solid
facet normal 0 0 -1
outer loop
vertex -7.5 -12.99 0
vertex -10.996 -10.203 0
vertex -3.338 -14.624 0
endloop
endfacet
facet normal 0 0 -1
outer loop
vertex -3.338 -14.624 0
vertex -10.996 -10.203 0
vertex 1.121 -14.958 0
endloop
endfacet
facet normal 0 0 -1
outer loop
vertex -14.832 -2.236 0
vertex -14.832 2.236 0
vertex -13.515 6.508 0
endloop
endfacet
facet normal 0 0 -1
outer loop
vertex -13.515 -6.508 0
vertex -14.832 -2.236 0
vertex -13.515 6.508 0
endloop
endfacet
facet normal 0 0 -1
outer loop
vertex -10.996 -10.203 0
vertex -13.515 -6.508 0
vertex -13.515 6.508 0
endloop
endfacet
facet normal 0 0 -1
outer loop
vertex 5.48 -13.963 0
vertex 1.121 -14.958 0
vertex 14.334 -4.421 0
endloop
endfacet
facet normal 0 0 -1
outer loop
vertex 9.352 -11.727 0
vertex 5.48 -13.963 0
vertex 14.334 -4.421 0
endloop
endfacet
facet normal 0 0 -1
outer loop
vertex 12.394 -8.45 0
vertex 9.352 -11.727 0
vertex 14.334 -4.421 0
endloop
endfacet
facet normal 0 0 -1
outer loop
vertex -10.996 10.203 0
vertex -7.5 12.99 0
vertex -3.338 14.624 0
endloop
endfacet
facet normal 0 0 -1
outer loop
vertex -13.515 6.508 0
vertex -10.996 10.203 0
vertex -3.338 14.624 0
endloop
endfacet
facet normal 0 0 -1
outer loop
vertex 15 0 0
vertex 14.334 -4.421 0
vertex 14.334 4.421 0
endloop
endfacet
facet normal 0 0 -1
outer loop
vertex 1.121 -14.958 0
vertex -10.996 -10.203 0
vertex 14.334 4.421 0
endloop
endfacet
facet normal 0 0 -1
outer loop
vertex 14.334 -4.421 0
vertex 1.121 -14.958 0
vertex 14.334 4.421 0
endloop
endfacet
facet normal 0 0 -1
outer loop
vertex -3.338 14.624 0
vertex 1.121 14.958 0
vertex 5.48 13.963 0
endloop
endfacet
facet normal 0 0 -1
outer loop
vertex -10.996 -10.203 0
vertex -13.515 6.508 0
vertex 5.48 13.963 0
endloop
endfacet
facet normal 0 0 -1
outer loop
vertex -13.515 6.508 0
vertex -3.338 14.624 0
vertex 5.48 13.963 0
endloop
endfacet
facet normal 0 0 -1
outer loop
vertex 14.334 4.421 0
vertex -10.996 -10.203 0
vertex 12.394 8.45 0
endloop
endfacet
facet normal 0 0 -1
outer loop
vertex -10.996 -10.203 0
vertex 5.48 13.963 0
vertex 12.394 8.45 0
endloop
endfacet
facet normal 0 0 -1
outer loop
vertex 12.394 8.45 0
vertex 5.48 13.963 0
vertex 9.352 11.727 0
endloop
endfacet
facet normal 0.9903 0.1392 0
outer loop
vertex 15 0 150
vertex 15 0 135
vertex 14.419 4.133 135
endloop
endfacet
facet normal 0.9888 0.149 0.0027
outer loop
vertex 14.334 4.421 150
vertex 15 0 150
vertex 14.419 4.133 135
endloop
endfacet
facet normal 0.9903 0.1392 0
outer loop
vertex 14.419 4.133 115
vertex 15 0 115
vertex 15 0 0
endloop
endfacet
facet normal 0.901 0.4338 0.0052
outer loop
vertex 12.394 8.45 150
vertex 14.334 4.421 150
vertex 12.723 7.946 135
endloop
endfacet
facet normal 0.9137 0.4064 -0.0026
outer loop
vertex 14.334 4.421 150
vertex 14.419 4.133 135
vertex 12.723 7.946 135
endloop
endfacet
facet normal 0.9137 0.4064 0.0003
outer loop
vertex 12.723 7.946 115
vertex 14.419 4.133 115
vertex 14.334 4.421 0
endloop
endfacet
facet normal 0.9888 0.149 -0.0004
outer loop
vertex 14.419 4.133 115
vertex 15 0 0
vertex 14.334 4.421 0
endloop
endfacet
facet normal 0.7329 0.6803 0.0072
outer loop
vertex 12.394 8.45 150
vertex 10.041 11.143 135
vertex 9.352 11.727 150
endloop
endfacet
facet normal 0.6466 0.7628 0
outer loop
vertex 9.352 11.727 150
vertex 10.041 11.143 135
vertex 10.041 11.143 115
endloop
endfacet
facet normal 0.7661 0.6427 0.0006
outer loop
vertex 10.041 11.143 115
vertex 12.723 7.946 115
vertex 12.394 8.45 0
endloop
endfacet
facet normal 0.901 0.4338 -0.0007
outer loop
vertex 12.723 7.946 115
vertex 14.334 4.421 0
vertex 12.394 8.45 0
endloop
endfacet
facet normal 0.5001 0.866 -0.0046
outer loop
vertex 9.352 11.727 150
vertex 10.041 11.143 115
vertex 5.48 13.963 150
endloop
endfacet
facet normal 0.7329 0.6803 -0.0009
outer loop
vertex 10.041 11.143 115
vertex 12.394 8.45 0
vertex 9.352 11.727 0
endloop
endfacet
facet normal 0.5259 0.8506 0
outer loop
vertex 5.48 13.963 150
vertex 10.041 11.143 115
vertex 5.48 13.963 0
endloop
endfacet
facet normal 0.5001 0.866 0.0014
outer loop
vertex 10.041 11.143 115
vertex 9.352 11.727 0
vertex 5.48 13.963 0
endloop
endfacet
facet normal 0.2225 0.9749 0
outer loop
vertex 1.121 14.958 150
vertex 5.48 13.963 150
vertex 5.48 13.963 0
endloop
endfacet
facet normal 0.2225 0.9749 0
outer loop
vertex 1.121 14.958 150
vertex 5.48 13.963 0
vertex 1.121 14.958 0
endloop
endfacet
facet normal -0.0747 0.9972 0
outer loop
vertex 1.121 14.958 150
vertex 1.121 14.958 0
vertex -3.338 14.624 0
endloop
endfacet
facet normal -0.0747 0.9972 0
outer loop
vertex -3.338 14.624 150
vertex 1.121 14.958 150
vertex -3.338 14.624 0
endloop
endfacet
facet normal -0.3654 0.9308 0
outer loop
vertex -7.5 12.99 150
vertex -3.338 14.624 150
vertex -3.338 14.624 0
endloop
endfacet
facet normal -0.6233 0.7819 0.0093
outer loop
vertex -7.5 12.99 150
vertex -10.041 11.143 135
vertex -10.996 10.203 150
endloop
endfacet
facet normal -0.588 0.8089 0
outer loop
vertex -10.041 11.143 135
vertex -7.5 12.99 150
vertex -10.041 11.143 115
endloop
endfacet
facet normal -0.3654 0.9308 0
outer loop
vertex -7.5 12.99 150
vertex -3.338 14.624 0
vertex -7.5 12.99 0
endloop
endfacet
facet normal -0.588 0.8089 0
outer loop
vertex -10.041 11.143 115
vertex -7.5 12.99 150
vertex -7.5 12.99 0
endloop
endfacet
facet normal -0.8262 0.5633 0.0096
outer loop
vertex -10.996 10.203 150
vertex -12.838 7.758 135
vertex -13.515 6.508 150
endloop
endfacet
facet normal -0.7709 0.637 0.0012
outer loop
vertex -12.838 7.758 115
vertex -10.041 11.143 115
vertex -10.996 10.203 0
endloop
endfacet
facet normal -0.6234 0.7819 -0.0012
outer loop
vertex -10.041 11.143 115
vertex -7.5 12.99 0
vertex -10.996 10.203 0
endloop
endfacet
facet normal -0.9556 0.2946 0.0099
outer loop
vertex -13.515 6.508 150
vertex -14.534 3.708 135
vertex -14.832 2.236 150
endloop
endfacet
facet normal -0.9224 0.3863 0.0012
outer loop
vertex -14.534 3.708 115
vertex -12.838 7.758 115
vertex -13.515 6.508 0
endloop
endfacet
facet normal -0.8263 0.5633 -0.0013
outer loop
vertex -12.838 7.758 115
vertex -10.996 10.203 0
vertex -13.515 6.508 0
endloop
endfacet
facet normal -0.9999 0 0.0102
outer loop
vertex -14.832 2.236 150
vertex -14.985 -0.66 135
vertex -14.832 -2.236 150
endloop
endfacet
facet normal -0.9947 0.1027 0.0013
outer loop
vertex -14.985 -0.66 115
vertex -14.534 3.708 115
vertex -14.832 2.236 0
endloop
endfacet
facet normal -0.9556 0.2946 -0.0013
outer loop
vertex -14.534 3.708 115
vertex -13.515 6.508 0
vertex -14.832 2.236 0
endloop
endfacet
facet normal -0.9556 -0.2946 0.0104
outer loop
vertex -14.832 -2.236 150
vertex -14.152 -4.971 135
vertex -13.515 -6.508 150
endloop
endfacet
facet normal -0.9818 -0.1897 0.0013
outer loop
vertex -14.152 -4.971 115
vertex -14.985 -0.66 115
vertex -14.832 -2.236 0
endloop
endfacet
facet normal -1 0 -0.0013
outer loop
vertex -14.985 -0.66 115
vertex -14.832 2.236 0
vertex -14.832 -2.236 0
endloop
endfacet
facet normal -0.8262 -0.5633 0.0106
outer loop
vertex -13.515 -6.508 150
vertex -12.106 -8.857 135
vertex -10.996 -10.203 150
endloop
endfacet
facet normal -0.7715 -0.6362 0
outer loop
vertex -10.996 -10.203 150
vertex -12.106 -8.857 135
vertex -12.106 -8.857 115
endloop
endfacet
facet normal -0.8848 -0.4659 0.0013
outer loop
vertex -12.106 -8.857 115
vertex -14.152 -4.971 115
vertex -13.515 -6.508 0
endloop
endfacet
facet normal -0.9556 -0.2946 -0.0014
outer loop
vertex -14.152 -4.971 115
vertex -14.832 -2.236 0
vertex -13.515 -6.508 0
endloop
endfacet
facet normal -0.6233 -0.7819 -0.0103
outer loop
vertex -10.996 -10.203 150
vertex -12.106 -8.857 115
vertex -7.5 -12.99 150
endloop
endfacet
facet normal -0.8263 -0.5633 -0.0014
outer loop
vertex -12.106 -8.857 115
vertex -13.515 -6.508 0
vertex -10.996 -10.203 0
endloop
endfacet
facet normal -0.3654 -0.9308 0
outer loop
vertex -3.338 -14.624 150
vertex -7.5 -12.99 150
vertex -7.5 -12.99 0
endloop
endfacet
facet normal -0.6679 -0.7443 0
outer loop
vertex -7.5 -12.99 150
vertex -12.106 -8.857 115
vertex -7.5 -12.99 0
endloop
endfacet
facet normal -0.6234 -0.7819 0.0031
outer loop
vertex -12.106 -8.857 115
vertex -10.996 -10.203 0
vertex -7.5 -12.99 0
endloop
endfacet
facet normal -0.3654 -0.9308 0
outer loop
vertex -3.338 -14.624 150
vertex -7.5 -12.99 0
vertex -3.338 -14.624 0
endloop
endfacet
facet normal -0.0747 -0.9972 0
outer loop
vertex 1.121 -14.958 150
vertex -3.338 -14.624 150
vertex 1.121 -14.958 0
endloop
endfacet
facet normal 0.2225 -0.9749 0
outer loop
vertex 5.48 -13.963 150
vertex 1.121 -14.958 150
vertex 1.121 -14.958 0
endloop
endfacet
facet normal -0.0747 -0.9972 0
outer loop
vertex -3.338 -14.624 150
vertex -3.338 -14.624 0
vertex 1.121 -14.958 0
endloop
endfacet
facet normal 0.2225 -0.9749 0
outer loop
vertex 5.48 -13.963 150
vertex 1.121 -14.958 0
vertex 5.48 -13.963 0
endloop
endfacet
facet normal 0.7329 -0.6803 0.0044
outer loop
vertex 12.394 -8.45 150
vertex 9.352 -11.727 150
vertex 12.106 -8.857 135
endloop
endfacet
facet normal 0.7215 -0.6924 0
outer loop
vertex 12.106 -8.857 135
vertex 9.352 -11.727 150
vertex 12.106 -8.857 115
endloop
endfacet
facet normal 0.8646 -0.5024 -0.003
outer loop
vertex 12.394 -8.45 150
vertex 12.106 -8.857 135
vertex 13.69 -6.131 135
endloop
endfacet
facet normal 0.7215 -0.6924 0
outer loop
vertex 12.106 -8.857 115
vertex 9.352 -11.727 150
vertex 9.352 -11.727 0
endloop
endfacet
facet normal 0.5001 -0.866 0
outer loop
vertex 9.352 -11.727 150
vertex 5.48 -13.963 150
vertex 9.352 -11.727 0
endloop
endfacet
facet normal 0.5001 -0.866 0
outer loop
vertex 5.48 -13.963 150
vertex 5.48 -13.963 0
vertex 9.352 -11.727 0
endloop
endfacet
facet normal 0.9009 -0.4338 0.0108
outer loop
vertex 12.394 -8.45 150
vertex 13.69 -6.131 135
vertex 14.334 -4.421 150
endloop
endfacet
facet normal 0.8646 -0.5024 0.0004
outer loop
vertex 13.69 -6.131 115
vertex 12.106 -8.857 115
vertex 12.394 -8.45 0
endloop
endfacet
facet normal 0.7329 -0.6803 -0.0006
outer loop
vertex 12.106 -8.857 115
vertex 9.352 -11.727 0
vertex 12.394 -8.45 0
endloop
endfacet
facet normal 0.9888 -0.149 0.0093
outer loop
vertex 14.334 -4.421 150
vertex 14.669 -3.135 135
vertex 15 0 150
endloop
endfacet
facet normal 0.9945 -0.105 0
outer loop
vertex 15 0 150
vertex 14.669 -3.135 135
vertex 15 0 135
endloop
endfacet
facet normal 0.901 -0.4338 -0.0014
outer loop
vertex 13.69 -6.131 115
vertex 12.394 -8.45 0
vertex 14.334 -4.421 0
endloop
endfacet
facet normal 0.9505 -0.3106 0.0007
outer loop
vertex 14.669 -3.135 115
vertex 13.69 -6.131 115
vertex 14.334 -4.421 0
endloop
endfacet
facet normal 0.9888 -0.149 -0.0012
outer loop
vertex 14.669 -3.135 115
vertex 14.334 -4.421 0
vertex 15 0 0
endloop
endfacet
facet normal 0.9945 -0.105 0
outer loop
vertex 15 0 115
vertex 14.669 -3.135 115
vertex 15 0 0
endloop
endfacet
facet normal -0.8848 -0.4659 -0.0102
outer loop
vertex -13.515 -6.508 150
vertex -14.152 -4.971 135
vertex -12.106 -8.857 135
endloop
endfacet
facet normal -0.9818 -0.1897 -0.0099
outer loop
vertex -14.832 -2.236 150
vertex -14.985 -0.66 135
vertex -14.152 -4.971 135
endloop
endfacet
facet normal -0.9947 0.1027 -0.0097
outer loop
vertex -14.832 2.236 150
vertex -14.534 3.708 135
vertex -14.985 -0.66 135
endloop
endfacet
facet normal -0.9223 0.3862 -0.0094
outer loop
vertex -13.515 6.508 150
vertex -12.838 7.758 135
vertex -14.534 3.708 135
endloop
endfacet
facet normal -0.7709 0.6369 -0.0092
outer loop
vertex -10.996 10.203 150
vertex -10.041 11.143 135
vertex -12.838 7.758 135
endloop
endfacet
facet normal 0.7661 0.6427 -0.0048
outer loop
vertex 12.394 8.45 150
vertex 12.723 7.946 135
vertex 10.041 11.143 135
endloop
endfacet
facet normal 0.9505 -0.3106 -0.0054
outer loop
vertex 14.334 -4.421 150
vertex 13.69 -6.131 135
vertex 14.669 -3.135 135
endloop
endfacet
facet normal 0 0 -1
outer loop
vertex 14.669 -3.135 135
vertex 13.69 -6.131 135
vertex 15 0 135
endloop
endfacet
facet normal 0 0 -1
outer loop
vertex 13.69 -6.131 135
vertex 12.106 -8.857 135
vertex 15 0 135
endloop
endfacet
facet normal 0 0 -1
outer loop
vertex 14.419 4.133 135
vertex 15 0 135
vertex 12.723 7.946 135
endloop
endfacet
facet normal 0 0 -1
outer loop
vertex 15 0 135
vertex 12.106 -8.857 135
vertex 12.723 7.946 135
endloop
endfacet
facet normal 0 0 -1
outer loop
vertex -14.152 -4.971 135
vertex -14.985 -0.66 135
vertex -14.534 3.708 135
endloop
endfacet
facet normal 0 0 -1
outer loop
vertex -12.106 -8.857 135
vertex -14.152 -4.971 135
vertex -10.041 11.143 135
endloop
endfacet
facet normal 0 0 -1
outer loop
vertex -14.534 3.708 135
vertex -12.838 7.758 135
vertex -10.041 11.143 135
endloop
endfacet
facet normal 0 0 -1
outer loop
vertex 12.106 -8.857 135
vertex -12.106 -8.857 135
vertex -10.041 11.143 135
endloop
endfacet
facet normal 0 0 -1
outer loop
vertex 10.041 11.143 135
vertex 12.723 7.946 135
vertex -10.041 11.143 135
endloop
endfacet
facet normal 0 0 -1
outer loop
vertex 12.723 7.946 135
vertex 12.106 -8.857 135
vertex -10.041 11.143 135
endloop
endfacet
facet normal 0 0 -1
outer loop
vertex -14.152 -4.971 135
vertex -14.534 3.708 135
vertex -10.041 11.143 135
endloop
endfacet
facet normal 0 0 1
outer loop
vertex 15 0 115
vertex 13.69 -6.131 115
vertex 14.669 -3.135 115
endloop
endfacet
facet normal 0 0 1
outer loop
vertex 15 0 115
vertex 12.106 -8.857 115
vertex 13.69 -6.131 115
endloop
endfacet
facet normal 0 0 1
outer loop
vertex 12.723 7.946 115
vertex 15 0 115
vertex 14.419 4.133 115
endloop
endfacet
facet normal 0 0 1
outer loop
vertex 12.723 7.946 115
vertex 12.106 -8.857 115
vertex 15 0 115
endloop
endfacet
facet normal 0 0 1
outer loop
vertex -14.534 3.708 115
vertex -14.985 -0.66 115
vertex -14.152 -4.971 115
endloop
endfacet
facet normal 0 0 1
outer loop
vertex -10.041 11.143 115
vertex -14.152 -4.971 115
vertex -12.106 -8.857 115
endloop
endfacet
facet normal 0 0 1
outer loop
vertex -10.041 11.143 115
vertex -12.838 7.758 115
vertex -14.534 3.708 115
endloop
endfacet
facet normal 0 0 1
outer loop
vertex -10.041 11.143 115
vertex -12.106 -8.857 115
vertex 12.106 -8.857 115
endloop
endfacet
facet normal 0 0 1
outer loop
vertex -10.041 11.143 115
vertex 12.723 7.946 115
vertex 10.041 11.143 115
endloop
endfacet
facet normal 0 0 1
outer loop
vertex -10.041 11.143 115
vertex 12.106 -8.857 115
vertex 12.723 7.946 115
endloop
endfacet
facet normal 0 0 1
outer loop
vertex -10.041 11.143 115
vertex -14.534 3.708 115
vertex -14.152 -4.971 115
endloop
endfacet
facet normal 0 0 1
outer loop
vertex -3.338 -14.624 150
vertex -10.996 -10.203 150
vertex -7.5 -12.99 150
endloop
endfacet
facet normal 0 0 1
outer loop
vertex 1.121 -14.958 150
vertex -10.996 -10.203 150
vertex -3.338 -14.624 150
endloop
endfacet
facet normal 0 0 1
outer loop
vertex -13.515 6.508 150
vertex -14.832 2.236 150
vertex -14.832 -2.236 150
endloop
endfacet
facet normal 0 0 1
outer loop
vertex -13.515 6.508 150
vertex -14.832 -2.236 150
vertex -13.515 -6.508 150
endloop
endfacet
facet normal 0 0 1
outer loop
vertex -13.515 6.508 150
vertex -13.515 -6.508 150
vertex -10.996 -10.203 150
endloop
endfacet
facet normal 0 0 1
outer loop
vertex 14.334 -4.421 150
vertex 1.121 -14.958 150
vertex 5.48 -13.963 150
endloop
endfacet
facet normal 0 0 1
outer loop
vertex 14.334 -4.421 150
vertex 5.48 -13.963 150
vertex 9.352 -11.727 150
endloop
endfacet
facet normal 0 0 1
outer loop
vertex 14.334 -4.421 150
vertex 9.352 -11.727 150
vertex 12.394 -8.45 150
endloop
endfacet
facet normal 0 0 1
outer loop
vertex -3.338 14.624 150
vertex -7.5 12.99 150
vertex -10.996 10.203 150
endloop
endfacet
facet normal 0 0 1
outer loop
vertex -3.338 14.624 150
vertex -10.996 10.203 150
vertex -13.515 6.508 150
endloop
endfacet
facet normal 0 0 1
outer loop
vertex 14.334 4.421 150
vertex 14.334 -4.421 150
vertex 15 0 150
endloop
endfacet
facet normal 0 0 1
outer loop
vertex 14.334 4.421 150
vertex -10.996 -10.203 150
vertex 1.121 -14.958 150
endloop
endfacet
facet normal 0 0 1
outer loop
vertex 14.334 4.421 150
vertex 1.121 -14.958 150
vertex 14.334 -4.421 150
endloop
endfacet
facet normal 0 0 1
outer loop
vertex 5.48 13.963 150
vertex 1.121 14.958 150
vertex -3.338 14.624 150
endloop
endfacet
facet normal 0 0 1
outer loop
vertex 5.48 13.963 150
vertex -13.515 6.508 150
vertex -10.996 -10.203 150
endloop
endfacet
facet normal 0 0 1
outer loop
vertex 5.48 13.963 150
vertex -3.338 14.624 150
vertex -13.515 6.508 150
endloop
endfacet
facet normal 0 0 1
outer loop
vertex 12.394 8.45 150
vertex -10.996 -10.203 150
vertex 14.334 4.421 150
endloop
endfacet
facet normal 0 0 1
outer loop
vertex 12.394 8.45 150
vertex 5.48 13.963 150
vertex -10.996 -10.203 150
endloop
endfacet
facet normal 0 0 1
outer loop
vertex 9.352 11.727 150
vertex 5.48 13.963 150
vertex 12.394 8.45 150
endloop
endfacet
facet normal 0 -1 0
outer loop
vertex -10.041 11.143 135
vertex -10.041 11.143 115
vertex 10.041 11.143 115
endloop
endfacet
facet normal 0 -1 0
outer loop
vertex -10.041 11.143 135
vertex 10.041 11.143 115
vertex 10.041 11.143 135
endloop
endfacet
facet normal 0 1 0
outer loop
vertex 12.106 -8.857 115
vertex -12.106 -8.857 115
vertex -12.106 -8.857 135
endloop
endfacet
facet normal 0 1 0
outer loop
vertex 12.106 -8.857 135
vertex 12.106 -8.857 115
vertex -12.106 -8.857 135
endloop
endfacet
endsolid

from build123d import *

# Parameters (mm, degrees)
F0_R     = 15
F1_DEPTH = 150
F2_W     = 20
F2_H     = 20
F3_DEPTH = 25
F4_DEPTH = 25


with BuildPart() as f1:
    # F0 (on Top) → F1 (new body)
    with BuildSketch(Plane.XY):
        Circle(F0_R)
    extrude(amount=F1_DEPTH)

    # F2 (on Right) → F3 (cut)
    with BuildSketch(Plane.YZ):
        with Locations((1.143422, 125)):
            Rectangle(F2_W, F2_H)
    extrude(amount=-F3_DEPTH, mode=Mode.SUBTRACT)

    # F2 (on Right) → F4 (cut)
    with BuildSketch(Plane.YZ):
        with Locations((1.143422, 125)):
            Rectangle(F2_W, F2_H)
    extrude(amount=F4_DEPTH, mode=Mode.SUBTRACT)


solid = f1.part
